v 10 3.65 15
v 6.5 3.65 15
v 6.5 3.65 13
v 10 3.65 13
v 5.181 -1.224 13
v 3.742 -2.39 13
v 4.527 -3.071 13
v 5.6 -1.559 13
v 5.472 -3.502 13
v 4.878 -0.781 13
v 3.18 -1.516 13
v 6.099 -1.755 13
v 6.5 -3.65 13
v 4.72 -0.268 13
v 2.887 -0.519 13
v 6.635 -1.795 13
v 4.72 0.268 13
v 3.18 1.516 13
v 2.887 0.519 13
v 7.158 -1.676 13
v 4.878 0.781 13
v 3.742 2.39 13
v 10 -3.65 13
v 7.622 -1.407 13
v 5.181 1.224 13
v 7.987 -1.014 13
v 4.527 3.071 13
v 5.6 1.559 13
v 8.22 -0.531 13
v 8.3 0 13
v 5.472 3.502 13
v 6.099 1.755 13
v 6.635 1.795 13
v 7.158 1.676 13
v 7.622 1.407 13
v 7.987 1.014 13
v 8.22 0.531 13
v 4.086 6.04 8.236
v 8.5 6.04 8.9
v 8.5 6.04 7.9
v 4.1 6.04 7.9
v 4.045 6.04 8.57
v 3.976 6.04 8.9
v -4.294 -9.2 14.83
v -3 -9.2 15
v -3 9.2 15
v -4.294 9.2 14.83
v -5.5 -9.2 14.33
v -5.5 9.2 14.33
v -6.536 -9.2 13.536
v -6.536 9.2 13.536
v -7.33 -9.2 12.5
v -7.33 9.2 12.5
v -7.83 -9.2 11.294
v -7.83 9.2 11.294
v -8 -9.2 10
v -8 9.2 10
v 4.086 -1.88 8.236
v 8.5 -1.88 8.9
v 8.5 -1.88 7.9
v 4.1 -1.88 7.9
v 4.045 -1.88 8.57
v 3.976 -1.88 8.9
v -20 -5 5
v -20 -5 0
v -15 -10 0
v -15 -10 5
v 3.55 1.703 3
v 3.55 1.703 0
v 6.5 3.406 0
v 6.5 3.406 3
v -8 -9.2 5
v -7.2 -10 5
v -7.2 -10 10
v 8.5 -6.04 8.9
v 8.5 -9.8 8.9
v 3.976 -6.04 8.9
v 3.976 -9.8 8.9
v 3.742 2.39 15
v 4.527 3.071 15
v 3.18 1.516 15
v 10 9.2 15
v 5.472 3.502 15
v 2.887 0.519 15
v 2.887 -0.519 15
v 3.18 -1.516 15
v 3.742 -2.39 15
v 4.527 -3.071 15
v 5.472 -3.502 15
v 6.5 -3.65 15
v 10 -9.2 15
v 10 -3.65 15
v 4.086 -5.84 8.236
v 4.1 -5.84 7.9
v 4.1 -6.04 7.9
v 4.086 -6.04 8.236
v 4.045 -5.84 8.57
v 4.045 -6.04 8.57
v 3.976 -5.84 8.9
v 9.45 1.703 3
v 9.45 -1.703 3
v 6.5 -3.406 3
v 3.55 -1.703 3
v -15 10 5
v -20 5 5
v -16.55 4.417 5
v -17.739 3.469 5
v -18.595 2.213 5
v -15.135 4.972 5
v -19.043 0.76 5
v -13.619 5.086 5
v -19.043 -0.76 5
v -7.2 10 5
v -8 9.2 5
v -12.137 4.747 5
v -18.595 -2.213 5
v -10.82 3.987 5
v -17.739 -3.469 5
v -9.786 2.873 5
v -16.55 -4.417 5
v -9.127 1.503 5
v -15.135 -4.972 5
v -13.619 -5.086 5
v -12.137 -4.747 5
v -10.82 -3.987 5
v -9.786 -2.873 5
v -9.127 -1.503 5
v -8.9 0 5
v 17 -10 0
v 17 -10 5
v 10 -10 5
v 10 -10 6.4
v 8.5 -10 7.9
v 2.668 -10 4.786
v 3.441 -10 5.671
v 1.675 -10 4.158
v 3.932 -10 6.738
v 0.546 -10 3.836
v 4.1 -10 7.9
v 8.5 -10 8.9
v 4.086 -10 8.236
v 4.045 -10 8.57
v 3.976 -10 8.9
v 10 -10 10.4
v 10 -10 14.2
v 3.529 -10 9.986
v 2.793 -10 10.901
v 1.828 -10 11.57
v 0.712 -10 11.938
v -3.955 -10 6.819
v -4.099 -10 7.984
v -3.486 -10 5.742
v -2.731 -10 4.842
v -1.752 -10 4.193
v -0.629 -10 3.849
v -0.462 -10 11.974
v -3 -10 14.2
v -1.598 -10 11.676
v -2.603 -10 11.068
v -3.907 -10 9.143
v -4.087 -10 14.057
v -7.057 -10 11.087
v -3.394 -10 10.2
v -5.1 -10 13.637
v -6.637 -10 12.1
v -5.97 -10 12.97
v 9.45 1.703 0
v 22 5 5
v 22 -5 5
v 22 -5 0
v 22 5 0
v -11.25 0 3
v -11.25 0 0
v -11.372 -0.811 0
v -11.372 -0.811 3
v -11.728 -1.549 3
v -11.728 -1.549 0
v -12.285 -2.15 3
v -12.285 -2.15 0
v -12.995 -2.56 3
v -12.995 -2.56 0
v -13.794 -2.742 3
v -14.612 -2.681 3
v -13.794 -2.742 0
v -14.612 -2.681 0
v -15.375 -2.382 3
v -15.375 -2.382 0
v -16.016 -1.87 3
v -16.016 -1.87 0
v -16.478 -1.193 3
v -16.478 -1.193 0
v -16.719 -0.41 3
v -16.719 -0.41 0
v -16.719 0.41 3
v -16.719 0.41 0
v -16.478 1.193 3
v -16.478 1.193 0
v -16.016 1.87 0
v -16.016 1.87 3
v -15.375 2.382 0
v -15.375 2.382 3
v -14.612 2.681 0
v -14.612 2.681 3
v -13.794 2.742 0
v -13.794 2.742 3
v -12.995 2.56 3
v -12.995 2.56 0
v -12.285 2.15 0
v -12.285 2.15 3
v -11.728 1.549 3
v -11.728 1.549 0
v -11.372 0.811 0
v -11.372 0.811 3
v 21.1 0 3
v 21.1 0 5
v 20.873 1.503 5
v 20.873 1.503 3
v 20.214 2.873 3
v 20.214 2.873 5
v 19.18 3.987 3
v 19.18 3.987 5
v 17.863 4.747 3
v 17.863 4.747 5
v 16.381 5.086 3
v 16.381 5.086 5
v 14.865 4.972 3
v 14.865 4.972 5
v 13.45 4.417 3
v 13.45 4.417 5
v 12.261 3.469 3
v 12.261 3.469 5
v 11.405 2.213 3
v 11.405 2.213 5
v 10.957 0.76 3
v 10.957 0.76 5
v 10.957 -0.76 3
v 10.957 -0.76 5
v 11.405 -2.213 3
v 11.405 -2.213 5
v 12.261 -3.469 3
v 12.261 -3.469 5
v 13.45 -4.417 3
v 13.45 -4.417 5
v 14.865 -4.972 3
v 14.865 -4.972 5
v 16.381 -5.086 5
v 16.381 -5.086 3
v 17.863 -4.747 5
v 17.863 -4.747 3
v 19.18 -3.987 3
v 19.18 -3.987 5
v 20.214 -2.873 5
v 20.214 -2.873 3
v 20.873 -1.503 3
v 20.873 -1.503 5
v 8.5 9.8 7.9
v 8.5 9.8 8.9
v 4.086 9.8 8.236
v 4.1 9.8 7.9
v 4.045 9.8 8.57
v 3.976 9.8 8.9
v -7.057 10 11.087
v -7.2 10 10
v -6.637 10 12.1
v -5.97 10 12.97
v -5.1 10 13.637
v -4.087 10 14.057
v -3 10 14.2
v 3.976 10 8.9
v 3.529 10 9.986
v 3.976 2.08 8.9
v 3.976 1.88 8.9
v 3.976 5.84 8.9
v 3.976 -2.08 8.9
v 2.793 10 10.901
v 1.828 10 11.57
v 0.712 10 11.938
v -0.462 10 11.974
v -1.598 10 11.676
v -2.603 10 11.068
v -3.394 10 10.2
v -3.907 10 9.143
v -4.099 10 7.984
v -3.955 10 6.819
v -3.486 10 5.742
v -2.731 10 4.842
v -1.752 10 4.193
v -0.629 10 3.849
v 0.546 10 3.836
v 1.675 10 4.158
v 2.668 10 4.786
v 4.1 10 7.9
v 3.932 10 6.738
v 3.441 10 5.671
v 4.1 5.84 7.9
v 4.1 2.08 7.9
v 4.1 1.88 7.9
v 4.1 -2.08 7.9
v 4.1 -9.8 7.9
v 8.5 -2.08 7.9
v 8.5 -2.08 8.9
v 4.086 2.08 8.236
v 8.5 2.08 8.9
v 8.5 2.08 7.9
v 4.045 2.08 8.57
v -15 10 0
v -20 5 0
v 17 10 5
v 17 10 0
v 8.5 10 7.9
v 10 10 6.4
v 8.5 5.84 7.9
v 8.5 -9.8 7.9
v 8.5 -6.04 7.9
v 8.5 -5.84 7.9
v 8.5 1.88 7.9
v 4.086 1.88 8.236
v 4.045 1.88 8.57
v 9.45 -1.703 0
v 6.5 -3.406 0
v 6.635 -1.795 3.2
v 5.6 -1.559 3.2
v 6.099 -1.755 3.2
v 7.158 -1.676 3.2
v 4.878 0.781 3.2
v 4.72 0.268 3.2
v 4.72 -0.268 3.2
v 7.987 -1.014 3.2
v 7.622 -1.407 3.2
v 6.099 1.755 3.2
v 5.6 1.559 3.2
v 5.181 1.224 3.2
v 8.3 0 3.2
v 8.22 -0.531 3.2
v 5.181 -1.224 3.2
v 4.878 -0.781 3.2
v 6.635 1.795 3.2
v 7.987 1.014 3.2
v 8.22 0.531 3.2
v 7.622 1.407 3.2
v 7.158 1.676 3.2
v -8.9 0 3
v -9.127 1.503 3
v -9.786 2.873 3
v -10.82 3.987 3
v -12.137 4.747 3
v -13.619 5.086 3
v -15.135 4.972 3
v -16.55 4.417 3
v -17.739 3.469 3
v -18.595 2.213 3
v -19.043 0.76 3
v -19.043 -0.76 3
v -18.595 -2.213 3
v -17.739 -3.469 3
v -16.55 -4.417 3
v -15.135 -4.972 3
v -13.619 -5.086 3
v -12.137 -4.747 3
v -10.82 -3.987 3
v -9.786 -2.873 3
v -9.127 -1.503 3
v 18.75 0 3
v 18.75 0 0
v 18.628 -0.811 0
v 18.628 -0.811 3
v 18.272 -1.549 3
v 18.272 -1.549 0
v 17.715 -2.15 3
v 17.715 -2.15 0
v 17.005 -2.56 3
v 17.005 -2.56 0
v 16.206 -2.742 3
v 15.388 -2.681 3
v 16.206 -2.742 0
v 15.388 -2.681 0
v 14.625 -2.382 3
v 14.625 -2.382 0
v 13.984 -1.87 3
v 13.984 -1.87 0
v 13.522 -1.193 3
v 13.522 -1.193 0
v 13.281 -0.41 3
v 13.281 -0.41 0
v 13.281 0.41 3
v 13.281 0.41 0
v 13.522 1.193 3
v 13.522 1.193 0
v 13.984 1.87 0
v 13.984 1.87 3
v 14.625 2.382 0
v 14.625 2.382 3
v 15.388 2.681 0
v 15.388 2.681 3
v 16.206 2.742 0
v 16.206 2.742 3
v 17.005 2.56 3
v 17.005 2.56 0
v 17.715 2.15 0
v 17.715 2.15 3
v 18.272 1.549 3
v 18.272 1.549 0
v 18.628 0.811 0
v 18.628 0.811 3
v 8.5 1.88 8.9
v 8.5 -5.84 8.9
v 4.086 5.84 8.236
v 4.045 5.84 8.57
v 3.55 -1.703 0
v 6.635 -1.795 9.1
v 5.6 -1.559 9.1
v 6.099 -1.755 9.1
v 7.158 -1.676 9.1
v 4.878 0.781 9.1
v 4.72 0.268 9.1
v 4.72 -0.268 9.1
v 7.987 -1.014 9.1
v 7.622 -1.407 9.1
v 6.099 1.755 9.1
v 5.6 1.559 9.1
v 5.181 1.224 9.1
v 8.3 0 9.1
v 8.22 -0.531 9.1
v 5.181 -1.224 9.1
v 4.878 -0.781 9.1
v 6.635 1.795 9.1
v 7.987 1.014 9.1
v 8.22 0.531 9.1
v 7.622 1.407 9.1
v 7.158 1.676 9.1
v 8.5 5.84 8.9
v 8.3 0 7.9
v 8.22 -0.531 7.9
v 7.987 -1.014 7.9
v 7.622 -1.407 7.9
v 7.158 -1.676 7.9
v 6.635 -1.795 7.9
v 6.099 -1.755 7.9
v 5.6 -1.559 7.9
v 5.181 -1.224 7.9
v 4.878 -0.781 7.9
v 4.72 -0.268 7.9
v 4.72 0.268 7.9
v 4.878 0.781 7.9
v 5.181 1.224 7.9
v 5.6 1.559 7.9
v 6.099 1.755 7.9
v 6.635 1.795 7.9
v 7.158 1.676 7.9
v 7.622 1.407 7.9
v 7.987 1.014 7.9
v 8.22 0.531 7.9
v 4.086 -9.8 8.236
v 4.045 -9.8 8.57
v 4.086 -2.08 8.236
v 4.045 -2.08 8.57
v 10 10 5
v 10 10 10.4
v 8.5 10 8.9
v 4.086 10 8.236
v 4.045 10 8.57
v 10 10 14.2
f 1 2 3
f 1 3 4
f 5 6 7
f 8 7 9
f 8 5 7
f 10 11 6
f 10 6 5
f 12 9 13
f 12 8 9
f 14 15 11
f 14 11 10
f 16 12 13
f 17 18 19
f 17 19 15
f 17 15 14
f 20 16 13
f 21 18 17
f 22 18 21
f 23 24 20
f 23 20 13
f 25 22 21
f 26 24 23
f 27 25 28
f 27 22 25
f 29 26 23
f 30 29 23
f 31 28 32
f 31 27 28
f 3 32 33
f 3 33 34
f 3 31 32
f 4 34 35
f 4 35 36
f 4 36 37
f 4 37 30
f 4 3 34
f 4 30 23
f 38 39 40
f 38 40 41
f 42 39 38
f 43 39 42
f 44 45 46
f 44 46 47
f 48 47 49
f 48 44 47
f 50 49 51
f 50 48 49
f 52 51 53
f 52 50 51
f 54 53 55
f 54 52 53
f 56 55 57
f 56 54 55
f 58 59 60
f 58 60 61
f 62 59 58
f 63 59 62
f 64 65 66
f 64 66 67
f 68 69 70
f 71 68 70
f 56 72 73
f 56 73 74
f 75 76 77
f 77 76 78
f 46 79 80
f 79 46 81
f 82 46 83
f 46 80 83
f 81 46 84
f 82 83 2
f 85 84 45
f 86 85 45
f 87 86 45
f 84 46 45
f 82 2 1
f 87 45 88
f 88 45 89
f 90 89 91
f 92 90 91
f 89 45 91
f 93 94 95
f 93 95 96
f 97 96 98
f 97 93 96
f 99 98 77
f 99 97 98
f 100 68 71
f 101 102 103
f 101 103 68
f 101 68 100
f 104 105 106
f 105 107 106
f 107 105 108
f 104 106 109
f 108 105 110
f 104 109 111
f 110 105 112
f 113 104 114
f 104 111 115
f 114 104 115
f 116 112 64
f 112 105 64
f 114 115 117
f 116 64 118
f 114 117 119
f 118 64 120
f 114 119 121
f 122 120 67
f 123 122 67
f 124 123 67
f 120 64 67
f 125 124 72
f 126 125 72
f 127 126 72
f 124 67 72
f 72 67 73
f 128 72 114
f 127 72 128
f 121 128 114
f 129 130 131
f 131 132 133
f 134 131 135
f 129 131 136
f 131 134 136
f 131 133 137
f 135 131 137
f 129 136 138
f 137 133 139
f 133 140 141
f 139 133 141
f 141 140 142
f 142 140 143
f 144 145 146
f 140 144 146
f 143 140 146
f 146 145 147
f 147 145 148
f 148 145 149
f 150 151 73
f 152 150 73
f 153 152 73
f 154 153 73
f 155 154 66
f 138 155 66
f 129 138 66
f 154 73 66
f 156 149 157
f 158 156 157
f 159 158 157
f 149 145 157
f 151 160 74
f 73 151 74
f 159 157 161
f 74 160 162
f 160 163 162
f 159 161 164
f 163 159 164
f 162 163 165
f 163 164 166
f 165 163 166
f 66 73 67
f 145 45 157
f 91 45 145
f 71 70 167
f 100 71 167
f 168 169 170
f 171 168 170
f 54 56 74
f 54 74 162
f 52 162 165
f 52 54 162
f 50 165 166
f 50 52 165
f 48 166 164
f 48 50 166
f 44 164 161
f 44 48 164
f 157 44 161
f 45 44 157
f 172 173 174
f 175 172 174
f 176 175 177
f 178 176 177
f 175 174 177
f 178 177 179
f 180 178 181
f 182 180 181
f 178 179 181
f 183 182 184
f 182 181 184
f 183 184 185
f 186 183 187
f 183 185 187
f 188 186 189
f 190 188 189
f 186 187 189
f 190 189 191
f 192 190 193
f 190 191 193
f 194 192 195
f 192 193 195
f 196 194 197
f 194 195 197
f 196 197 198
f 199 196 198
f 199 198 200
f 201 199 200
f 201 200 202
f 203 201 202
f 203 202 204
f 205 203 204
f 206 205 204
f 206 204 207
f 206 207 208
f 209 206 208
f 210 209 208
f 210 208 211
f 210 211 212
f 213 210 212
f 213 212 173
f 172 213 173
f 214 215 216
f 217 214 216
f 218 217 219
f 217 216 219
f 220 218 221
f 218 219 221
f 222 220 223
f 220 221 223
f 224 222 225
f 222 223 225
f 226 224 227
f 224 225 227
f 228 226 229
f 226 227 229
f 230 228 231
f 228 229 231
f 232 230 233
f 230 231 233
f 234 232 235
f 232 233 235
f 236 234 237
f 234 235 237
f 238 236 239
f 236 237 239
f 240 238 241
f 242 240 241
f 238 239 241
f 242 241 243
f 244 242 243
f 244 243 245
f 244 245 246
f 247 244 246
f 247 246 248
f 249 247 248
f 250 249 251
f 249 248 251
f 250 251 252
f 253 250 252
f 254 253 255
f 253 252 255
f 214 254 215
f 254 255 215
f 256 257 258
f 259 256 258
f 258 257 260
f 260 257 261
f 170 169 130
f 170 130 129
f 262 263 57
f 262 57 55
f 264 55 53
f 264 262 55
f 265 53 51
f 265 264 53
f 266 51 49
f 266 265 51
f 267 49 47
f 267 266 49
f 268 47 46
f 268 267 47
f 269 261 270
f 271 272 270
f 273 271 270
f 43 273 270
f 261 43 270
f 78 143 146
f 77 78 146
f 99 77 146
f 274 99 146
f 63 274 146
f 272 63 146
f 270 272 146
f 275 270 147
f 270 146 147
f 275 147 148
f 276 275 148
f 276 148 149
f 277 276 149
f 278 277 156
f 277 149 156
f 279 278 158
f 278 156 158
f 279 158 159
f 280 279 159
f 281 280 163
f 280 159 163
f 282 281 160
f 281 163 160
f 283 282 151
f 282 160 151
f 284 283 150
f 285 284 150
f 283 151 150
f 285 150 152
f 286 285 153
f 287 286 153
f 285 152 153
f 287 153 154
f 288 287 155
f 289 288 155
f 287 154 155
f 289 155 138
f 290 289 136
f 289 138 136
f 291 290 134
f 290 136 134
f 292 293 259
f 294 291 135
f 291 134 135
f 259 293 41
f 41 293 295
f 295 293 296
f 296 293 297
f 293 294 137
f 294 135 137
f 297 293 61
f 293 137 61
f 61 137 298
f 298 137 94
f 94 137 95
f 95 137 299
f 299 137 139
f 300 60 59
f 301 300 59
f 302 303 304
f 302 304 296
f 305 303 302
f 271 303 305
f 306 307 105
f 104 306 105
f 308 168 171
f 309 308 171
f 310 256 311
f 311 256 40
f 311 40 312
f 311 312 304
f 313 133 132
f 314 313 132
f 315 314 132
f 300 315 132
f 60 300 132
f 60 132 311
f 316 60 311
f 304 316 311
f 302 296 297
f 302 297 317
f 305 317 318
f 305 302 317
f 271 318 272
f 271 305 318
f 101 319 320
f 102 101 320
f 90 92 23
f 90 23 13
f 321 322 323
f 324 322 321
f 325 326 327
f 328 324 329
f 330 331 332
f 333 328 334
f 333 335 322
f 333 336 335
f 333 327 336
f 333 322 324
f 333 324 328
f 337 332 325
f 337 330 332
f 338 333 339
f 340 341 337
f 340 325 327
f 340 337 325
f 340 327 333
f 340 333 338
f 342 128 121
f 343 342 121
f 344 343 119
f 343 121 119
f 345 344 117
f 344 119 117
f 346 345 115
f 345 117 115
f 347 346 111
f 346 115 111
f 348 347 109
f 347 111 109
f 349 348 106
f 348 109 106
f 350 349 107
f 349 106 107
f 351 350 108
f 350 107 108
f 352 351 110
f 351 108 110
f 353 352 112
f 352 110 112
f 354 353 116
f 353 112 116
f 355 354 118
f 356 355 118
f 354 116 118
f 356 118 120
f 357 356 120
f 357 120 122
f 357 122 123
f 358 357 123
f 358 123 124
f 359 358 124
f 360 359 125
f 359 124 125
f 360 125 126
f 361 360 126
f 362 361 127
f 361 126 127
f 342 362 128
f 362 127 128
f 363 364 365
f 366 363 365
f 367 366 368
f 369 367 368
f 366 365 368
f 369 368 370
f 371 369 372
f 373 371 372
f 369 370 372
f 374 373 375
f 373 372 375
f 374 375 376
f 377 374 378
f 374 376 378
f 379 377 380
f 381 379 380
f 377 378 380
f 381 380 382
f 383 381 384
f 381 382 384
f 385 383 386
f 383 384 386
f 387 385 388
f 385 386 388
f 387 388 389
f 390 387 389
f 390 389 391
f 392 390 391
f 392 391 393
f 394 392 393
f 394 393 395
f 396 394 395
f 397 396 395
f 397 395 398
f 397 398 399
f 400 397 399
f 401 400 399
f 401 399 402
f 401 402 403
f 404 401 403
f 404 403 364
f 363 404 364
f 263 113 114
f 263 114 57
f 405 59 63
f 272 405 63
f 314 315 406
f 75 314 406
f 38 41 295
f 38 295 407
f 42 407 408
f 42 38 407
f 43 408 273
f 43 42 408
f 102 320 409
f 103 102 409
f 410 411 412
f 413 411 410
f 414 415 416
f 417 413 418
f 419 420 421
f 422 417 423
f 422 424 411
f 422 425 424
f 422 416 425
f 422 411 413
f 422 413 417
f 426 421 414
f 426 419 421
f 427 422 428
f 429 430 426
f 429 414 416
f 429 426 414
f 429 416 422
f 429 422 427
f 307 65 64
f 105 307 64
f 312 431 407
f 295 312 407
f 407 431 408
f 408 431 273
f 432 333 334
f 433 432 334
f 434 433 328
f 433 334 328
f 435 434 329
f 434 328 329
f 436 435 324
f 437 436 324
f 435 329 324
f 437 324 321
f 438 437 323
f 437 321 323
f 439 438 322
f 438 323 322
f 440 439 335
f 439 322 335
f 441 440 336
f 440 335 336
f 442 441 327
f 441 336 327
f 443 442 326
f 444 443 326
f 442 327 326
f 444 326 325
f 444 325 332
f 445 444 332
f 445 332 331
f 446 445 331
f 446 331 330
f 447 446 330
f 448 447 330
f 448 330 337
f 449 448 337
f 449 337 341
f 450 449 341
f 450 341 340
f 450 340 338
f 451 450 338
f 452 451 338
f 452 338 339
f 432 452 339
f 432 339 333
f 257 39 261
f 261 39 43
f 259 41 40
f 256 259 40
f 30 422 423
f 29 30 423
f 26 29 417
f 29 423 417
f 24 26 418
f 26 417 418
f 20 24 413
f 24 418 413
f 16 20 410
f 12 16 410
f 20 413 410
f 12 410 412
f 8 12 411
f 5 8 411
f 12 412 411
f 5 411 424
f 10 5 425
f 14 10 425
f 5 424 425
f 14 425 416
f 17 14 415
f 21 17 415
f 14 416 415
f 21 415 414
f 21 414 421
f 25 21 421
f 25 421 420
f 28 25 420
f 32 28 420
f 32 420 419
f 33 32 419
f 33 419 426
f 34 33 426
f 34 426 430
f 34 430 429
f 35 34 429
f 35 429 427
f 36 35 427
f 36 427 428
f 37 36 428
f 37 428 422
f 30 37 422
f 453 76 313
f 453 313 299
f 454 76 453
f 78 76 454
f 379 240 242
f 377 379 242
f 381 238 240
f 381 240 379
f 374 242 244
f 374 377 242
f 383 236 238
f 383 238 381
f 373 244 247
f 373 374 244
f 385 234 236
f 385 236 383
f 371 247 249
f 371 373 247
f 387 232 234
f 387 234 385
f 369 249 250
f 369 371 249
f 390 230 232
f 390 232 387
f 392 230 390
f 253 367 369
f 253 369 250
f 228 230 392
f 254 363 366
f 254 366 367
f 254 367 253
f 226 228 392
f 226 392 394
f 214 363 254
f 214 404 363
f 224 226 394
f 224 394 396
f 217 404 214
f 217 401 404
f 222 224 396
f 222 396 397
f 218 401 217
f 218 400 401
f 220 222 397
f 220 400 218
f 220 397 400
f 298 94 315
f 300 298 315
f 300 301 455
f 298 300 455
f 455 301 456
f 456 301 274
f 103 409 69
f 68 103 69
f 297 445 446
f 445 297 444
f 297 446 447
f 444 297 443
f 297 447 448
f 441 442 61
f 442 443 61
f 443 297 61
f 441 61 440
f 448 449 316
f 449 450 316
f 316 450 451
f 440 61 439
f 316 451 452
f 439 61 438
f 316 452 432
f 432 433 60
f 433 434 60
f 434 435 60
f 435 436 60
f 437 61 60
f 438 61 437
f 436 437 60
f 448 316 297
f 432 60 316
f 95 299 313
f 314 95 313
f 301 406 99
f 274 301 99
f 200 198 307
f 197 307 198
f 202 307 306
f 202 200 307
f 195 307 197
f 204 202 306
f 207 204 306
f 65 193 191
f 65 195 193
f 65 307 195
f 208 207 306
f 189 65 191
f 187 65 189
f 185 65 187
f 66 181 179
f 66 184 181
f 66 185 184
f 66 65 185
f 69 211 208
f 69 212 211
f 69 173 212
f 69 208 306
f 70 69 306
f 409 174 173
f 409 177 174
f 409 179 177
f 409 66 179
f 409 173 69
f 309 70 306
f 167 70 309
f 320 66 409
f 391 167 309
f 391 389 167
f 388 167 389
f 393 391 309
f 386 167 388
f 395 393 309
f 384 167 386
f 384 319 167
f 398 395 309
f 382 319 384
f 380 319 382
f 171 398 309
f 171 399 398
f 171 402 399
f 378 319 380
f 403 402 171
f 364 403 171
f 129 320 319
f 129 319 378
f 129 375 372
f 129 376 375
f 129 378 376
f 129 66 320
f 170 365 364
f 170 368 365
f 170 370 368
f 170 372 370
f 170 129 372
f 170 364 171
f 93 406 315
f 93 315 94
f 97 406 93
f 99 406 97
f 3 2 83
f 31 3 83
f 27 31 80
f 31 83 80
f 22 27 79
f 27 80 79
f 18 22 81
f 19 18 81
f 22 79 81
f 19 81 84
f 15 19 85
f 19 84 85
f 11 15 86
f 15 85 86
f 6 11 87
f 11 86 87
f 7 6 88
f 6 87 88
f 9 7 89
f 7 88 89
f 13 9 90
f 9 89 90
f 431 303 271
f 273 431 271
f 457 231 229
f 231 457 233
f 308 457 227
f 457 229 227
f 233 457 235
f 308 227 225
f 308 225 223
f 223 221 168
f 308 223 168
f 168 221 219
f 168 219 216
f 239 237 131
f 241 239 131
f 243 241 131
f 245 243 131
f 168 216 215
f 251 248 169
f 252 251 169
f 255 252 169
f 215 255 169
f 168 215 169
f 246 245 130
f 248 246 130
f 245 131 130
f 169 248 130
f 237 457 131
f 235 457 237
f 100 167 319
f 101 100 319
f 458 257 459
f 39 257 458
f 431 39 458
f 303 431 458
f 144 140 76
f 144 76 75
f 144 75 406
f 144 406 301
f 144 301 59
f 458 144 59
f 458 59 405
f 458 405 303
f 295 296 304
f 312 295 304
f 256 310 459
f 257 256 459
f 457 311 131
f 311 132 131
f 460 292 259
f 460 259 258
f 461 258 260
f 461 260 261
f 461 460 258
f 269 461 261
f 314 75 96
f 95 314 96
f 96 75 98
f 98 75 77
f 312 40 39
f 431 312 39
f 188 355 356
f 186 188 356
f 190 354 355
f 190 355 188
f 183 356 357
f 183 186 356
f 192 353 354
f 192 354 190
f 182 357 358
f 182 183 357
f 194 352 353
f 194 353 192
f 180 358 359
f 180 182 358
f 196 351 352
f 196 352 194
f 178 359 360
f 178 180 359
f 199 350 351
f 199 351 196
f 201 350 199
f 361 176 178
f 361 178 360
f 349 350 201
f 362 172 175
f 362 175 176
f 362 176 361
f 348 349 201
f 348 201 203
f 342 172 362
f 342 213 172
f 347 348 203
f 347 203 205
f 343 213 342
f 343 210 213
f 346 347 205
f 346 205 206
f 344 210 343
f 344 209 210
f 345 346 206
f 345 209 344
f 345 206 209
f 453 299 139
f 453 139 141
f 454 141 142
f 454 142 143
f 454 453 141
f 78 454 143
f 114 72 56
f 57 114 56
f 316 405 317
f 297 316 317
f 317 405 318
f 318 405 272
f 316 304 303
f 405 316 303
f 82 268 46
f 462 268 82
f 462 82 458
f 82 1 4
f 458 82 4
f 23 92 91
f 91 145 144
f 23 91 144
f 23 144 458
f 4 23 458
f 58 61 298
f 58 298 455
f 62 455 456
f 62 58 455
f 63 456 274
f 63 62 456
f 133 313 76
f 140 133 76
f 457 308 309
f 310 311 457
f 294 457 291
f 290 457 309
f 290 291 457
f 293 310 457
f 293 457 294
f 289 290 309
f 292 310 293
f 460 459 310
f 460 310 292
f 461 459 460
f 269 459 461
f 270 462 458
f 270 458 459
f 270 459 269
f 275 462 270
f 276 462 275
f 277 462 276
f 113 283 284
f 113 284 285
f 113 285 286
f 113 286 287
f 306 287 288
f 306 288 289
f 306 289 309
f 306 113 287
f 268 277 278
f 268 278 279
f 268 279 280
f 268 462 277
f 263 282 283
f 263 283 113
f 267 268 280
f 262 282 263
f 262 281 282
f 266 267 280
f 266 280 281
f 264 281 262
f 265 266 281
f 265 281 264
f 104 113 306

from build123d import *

# Parameters (mm, degrees)
PAD_DEPTH           = 10
SKETCH001_R         = 2.75
SKETCH001_R_2       = 1.8
POCKET_DEPTH        = 15.001
POCKET001_DEPTH     = 3
SKETCH003_R         = 5.1
POCKET002_DEPTH     = 2
SKETCH004_R         = 1.9
PAD001_DEPTH        = 0.2
SKETCH005_R         = 2.95
PAD002_DEPTH        = 0.2
PAD003_DEPTH        = 0.2
LINEARPATTERN_COUNT = 6
LINEARPATTERN_PITCH = 3.96
POCKET003_DEPTH     = 2
CHAMFER_SIZE        = 5
CHAMFER001_SIZE     = 0.8


with BuildPart() as part:
    # Sketch → Pad (new body, symmetric)
    with BuildSketch(Plane.XZ):
        with BuildLine():
            ThreePointArc((3.976179, 8.9), (-4.068927, 7.396182), (4.1, 7.9))
            Line((4.1, 7.9), (8.5, 7.9))
            Line((8.5, 7.9), (10, 6.4))
            Line((10, 6.4), (10, 5))
            Line((10, 5), (22, 5))
            Line((22, 5), (22, 0))
            Line((-20, 0), (22, 0))
            Line((-20, 0), (-20, 5))
            Line((-20, 5), (-8, 5))
            Line((-8, 5), (-8, 10))
            ThreePointArc((-3, 15), (-6.535534, 13.535534), (-8, 10))
            Line((-3, 15), (10, 15))
            Line((10, 15), (10, 10.4))
            Line((8.5, 8.9), (10, 10.4))
            Line((8.5, 8.9), (3.976179, 8.9))
        make_face()
    extrude(amount=PAD_DEPTH, both=True)

    # Sketch001 → Pocket (cut, through all)
    with BuildSketch(Plane(origin=(0, 0, 0), x_dir=(1, 0, 0), z_dir=(0, 0, -1))):
        with Locations((-14, 0)):
            Circle(SKETCH001_R)
        with Locations((16, 0)):
            Circle(SKETCH001_R)
        with Locations((6.5, 0)):
            Circle(SKETCH001_R_2)
    extrude(amount=-POCKET_DEPTH, mode=Mode.SUBTRACT)

    # Sketch002 → Pocket001 (cut)
    with BuildSketch(Plane(origin=(0, 0, 0), x_dir=(1, 0, 0), z_dir=(0, 0, -1))):
        Polygon((6.5, 3.406367), (3.55, 1.703183), (3.55, -1.703183), (6.5, -3.406367), (9.45, -1.703183), (9.45, 1.703183), align=None)
    extrude(amount=-POCKET001_DEPTH, mode=Mode.SUBTRACT)

    # Sketch003 → Pocket002 (cut)
    with BuildSketch(Plane.XY.offset(5)):
        with Locations((-14, 0)):
            Circle(SKETCH003_R)
        with Locations((16, 0)):
            Circle(SKETCH003_R)
    extrude(amount=-POCKET002_DEPTH, mode=Mode.SUBTRACT)

    # Sketch004 → Pad001 (join)
    with BuildSketch(Plane.XY.offset(8.9)):
        with Locations((6.5, 0)):
            Circle(SKETCH004_R)
    extrude(amount=PAD001_DEPTH)

    # Sketch005 → Pad002 (join)
    with BuildSketch(Plane.XY.offset(3)):
        with Locations((6.5, 0)):
            Circle(SKETCH005_R)
    extrude(amount=PAD002_DEPTH)

    # Sketch006 → Pad003 (join)
    with BuildSketch(Plane.XZ.offset(-10)):
        with BuildLine():
            ThreePointArc((4.1, 7.9), (4.068927, 8.403818), (3.976179, 8.9))
            Line((8.5, 8.9), (3.976179, 8.9))
            Line((8.5, 7.9), (8.5, 8.9))
            Line((4.1, 7.9), (8.5, 7.9))
        make_face()
    pad003 = extrude(amount=PAD003_DEPTH)

    # LinearPattern: Pad003 ×6
    with Locations(*[(0, -i * LINEARPATTERN_PITCH, 0) for i in range(1, LINEARPATTERN_COUNT)]):
        add(pad003)

    # Sketch007 → Pocket003 (cut)
    with BuildSketch(Plane.XY.offset(15)):
        with BuildLine():
            ThreePointArc((6.5, 3.65), (2.85, 0), (6.5, -3.65))
            Line((10.5, -3.65), (6.5, -3.65))
            Line((10.5, 3.65), (10.5, -3.65))
            Line((6.5, 3.65), (10.5, 3.65))
        make_face()
    extrude(amount=-POCKET003_DEPTH, mode=Mode.SUBTRACT)

    # Chamfer
    chamfer_edges = [part.edges().sort_by_distance(p)[0] for p in [
        (22, -10, 2.5),
        (-20, -10, 2.5),
        (22, 10, 2.5),
        (-20, 10, 2.5),
    ]]
    chamfer(chamfer_edges, length=CHAMFER_SIZE)

    # Chamfer001
    chamfer001_edges = [part.edges().sort_by_distance(p)[0] for p in [
        (-8, -10, 7.5),
        (-6.535534, -10, 13.535534),
        (3.5, -10, 15),
        (3.5, 10, 15),
        (-6.535534, 10, 13.535534),
        (-8, 10, 7.5),
    ]]
    chamfer(chamfer001_edges, length=CHAMFER001_SIZE)


solid = part.part
